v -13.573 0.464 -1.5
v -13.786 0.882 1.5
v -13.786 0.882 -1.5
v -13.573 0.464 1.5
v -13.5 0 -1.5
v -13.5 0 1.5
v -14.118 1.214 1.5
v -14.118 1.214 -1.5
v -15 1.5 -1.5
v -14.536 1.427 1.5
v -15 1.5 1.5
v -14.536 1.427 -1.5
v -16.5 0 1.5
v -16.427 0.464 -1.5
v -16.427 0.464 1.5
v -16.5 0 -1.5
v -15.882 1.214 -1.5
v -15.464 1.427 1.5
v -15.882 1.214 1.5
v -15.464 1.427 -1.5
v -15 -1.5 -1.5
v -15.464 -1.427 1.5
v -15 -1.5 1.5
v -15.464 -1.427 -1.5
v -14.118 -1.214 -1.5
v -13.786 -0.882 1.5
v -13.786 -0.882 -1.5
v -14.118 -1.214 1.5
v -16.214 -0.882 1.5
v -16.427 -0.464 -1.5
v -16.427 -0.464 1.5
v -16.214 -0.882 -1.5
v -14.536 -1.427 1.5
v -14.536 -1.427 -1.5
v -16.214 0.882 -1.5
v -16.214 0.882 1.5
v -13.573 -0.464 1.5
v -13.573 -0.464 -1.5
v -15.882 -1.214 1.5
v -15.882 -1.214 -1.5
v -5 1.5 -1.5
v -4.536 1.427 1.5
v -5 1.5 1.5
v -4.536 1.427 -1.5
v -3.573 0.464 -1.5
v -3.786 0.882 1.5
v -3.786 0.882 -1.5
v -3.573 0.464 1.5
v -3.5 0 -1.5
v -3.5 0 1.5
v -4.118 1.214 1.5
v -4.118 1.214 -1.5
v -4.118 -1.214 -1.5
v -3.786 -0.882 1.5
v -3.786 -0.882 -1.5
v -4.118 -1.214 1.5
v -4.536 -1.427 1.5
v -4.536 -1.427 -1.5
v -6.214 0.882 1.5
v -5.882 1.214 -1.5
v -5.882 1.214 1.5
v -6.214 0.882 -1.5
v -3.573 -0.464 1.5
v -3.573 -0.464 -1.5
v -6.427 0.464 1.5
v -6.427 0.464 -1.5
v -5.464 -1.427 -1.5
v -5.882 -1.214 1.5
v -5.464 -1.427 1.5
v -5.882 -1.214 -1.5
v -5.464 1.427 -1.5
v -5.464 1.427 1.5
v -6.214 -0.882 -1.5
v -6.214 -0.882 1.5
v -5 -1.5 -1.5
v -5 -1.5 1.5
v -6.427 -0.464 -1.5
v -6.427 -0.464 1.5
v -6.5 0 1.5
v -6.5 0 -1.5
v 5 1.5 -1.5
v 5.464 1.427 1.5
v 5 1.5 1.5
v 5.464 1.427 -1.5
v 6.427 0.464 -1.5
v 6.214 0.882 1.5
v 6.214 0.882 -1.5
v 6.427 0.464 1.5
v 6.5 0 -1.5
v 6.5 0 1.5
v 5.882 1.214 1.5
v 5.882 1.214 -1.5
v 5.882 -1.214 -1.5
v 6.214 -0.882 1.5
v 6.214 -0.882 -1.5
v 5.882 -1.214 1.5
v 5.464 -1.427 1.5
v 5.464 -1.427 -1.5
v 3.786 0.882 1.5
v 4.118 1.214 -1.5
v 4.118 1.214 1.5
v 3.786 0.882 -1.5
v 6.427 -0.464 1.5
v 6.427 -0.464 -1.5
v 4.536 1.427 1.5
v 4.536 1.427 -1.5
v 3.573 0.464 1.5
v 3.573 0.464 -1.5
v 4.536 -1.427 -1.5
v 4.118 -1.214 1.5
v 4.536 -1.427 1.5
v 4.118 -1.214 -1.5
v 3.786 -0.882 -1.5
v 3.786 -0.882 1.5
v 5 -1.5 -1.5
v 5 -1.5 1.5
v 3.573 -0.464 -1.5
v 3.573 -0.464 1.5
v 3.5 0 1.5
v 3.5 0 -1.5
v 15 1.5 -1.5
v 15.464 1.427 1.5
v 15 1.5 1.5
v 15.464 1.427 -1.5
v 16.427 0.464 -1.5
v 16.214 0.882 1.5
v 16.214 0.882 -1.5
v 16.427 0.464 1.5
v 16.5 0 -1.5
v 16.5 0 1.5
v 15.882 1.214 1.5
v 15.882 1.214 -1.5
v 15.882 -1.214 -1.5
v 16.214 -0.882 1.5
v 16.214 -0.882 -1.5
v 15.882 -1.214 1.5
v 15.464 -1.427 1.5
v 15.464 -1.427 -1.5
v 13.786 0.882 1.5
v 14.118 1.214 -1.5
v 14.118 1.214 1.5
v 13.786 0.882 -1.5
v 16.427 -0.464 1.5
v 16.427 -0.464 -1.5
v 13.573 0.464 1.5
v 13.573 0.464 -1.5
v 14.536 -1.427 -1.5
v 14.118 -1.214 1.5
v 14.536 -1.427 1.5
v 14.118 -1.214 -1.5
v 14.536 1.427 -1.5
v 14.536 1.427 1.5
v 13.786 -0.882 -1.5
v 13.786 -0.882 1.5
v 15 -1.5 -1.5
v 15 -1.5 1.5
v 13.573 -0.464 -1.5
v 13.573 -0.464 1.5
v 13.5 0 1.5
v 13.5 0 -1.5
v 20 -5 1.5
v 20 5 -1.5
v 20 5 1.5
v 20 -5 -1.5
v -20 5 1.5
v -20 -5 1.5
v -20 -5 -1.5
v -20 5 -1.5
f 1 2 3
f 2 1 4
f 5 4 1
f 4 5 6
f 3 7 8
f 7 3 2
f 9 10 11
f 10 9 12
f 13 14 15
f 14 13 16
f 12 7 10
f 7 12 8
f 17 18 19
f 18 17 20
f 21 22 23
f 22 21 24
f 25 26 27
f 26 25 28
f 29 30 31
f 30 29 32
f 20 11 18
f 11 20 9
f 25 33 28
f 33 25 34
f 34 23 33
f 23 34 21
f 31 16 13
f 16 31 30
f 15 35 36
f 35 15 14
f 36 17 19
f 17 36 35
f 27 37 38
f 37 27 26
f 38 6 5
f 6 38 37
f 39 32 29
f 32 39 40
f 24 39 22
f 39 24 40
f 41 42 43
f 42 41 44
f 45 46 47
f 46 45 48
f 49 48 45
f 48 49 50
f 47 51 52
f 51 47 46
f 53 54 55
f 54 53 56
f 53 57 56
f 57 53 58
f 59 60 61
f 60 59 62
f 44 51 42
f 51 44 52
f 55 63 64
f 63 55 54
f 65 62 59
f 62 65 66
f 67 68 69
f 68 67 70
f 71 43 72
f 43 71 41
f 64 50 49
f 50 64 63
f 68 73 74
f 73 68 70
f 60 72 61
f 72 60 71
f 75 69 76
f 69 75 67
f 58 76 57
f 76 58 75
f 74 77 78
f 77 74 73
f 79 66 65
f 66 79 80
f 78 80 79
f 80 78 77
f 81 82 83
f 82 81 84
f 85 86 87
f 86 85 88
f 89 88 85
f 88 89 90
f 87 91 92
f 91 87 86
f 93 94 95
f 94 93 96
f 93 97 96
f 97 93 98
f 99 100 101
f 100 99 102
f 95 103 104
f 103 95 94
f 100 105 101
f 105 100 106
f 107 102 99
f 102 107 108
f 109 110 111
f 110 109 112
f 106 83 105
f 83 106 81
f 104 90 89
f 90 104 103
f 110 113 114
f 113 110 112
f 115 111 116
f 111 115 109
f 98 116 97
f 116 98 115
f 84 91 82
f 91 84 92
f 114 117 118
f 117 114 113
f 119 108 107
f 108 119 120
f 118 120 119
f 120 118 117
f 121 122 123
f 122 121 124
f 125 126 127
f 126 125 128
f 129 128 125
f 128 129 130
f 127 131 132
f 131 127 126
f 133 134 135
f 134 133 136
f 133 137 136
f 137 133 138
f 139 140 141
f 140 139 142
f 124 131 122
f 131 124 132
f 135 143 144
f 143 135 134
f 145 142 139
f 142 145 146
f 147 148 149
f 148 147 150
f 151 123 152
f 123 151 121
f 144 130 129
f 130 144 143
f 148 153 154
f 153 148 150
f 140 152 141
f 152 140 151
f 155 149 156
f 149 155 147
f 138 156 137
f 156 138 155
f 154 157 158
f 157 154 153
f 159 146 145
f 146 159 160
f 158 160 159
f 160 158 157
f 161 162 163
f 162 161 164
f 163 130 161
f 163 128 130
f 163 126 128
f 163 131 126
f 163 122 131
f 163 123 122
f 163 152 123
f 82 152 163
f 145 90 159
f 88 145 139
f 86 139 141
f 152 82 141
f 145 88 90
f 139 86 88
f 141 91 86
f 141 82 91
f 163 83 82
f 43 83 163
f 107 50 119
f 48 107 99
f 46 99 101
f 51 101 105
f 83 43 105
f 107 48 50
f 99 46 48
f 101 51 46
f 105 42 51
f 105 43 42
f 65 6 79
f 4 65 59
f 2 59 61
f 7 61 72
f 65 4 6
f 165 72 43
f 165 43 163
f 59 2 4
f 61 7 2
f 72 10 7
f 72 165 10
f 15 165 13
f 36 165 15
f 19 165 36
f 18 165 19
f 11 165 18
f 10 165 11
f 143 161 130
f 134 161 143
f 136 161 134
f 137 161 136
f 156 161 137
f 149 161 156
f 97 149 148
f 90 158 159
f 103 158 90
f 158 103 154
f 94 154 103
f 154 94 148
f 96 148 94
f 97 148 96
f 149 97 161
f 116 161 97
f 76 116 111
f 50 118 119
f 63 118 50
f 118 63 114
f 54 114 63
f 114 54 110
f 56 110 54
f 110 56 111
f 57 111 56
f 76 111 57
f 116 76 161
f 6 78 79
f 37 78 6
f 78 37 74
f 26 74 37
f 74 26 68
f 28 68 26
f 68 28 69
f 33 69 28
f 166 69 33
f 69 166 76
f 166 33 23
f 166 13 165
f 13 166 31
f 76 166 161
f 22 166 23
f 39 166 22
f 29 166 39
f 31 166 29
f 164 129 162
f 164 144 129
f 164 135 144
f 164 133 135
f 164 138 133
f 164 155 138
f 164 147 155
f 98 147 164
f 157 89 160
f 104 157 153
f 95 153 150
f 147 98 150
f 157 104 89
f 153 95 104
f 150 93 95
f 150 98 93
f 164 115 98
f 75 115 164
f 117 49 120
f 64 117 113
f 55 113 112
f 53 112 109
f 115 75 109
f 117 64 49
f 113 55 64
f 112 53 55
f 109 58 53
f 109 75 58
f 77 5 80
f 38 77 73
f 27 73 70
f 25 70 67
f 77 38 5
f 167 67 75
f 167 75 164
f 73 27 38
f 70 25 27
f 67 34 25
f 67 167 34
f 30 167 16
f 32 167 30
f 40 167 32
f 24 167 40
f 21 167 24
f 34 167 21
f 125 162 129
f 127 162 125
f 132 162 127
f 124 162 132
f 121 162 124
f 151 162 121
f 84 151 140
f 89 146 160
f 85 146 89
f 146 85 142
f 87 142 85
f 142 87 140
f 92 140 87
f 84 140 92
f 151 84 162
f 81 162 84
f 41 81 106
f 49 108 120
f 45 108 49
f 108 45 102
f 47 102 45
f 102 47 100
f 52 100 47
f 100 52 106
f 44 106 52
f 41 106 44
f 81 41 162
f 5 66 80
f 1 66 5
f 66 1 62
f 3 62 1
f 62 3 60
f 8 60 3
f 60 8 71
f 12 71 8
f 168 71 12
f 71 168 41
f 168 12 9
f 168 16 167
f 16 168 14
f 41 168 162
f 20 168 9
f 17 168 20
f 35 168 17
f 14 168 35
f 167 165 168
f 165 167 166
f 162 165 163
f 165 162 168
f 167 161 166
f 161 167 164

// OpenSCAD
// file: utils/build_plate.scad
// Build Plate representation module
// Made by Makerbot (http://curriculum.makerbot.com/daily_lessons/february/openscad_buildplate.html)

//use this to include a build plate visualization in your openSCAD scripts. Very useful for things designed to be edited in Makerbot Customizer

//to use, either include or use <utils/build_plate.scad>

//then just call build_plate(); with the following arguments (also, you have to have a real object in your scene for this to render)

//putting 0 as the first argument will give you a Replicator 2 build plate
//putting 1 as the first argument will give you a Replicator 1 build plate
//putting 2 as the first argument will give you a Thingomatic build plate
//putting 3 as the first argument will give you a manually adjustable build plate (note: if you use this option, you need to specify your build plates X length (in mm) as the second argument and the Y length (in mm) as the third argument. eg. build_plate(3,150,120);)

/*

to give your user control of which build plate they see in Customizer, include the following code:

use <utils/build_plate.scad>

//for display only, doesn't contribute to final object
build_plate_selector = 0; //[0:Replicator 2,1: Replicator,2:Thingomatic,3:Manual]
//when Build Plate Selector is set to "manual" this controls the build plate x dimension
build_plate_manual_x = 100; //[100:400]
//when Build Plate Selector is set to "manual" this controls the build plate y dimension
build_plate_manual_y = 100; //[100:400]

build_plate(build_plate_selector,build_plate_manual_x,build_plate_manual_y);

*/




//to see how this works, uncomment the following code

//build_plate_selector = 0; //[0:Replicator 2,1: Replicator,2:Thingomatic,3:Manual]
//build_plate_manual_x = 100; //[100:400]
//build_plate_manual_y = 100; //[100:400]
//
//build_plate(build_plate_selector,build_plate_manual_x,build_plate_manual_y);
//
//cube(5);


module build_plate(bp,manX,manY){

		translate([0,0,-.52]){
			if(bp == 0){
				%cube([285,153,1],center = true);
			}
			if(bp == 1){
				%cube([225,145,1],center = true);
			}
			if(bp == 2){
				%cube([120,120,1],center = true);
			}
			if(bp == 3){
				%cube([manX,manY,1],center = true);
			}
		
		}
		translate([0,0,-.5]){
			if(bp == 0){
				for(i = [-14:14]){
					translate([i*10,0,0])
					%cube([.5,153,1.01],center = true);
				}
				for(i = [-7:7]){
					translate([0,i*10,0])
					%cube([285,.5,1.01],center = true);
				}	
			}
			if(bp == 1){
				for(i = [-11:11]){
					translate([i*10,0,0])
						%cube([.5,145,1.01],center = true);
				}
				for(i = [-7:7]){
					translate([0,i*10,0])
						%cube([225,.5,1.01],center = true);
				}
			}
			if(bp == 2){
				for(i = [-6:6]){
					translate([i*10,0,0])
						%cube([.5,120,1.01],center = true);
				}
				for(i = [-6:6]){
					translate([0,i*10,0])
						%cube([120,.5,1.01],center = true);
				}
			}
			if(bp == 3){
				for(i = [-(floor(manX/20)):floor(manX/20)]){
					translate([i*10,0,0])
						%cube([.5,manY,1.01],center = true);
				}
				for(i = [-(floor(manY/20)):floor(manY/20)]){
					translate([0,i*10,0])
						%cube([manX,.5,1.01],center = true);
				}
			}
		}
}
// main file
use <./utils/build_plate.scad> // Cuadricula transparente para la base
build_plate(3, 200,100); // No se incluye al renderizar


//----------------------------------------------------------
//-- Tutorial OpenScad
//-- Juan Gonzalez-Gomez (Obijuan) juan@iearobotics.com
//----------------------------------------------------------
//-- (c) Mayo, 2012
//-- Licencia GPL
//----------------------------------------------------------
//-- Ejemplo 1: Pieza de mecano
//-- Pieza basica de mecano, parametrizada
//----------------------------------------------------------

//-- Parametros de la pieza
drill=3;
d=10;
n = 4;

lx = n*d;
anchura = 10;
grosor = 3;

//-- construccion de la pieza
difference() {
  //-- Cuerpo de la pieza
  cube([lx,anchura,grosor],center=true);

  //-- Taladros
  translate([-lx/2+d/2,0,0])
    for (i=[0:n-1]) {
      translate([i*d,0,0])
        cylinder(r=drill/2, h=grosor+5, $fn=20,center=true);
  }
}
